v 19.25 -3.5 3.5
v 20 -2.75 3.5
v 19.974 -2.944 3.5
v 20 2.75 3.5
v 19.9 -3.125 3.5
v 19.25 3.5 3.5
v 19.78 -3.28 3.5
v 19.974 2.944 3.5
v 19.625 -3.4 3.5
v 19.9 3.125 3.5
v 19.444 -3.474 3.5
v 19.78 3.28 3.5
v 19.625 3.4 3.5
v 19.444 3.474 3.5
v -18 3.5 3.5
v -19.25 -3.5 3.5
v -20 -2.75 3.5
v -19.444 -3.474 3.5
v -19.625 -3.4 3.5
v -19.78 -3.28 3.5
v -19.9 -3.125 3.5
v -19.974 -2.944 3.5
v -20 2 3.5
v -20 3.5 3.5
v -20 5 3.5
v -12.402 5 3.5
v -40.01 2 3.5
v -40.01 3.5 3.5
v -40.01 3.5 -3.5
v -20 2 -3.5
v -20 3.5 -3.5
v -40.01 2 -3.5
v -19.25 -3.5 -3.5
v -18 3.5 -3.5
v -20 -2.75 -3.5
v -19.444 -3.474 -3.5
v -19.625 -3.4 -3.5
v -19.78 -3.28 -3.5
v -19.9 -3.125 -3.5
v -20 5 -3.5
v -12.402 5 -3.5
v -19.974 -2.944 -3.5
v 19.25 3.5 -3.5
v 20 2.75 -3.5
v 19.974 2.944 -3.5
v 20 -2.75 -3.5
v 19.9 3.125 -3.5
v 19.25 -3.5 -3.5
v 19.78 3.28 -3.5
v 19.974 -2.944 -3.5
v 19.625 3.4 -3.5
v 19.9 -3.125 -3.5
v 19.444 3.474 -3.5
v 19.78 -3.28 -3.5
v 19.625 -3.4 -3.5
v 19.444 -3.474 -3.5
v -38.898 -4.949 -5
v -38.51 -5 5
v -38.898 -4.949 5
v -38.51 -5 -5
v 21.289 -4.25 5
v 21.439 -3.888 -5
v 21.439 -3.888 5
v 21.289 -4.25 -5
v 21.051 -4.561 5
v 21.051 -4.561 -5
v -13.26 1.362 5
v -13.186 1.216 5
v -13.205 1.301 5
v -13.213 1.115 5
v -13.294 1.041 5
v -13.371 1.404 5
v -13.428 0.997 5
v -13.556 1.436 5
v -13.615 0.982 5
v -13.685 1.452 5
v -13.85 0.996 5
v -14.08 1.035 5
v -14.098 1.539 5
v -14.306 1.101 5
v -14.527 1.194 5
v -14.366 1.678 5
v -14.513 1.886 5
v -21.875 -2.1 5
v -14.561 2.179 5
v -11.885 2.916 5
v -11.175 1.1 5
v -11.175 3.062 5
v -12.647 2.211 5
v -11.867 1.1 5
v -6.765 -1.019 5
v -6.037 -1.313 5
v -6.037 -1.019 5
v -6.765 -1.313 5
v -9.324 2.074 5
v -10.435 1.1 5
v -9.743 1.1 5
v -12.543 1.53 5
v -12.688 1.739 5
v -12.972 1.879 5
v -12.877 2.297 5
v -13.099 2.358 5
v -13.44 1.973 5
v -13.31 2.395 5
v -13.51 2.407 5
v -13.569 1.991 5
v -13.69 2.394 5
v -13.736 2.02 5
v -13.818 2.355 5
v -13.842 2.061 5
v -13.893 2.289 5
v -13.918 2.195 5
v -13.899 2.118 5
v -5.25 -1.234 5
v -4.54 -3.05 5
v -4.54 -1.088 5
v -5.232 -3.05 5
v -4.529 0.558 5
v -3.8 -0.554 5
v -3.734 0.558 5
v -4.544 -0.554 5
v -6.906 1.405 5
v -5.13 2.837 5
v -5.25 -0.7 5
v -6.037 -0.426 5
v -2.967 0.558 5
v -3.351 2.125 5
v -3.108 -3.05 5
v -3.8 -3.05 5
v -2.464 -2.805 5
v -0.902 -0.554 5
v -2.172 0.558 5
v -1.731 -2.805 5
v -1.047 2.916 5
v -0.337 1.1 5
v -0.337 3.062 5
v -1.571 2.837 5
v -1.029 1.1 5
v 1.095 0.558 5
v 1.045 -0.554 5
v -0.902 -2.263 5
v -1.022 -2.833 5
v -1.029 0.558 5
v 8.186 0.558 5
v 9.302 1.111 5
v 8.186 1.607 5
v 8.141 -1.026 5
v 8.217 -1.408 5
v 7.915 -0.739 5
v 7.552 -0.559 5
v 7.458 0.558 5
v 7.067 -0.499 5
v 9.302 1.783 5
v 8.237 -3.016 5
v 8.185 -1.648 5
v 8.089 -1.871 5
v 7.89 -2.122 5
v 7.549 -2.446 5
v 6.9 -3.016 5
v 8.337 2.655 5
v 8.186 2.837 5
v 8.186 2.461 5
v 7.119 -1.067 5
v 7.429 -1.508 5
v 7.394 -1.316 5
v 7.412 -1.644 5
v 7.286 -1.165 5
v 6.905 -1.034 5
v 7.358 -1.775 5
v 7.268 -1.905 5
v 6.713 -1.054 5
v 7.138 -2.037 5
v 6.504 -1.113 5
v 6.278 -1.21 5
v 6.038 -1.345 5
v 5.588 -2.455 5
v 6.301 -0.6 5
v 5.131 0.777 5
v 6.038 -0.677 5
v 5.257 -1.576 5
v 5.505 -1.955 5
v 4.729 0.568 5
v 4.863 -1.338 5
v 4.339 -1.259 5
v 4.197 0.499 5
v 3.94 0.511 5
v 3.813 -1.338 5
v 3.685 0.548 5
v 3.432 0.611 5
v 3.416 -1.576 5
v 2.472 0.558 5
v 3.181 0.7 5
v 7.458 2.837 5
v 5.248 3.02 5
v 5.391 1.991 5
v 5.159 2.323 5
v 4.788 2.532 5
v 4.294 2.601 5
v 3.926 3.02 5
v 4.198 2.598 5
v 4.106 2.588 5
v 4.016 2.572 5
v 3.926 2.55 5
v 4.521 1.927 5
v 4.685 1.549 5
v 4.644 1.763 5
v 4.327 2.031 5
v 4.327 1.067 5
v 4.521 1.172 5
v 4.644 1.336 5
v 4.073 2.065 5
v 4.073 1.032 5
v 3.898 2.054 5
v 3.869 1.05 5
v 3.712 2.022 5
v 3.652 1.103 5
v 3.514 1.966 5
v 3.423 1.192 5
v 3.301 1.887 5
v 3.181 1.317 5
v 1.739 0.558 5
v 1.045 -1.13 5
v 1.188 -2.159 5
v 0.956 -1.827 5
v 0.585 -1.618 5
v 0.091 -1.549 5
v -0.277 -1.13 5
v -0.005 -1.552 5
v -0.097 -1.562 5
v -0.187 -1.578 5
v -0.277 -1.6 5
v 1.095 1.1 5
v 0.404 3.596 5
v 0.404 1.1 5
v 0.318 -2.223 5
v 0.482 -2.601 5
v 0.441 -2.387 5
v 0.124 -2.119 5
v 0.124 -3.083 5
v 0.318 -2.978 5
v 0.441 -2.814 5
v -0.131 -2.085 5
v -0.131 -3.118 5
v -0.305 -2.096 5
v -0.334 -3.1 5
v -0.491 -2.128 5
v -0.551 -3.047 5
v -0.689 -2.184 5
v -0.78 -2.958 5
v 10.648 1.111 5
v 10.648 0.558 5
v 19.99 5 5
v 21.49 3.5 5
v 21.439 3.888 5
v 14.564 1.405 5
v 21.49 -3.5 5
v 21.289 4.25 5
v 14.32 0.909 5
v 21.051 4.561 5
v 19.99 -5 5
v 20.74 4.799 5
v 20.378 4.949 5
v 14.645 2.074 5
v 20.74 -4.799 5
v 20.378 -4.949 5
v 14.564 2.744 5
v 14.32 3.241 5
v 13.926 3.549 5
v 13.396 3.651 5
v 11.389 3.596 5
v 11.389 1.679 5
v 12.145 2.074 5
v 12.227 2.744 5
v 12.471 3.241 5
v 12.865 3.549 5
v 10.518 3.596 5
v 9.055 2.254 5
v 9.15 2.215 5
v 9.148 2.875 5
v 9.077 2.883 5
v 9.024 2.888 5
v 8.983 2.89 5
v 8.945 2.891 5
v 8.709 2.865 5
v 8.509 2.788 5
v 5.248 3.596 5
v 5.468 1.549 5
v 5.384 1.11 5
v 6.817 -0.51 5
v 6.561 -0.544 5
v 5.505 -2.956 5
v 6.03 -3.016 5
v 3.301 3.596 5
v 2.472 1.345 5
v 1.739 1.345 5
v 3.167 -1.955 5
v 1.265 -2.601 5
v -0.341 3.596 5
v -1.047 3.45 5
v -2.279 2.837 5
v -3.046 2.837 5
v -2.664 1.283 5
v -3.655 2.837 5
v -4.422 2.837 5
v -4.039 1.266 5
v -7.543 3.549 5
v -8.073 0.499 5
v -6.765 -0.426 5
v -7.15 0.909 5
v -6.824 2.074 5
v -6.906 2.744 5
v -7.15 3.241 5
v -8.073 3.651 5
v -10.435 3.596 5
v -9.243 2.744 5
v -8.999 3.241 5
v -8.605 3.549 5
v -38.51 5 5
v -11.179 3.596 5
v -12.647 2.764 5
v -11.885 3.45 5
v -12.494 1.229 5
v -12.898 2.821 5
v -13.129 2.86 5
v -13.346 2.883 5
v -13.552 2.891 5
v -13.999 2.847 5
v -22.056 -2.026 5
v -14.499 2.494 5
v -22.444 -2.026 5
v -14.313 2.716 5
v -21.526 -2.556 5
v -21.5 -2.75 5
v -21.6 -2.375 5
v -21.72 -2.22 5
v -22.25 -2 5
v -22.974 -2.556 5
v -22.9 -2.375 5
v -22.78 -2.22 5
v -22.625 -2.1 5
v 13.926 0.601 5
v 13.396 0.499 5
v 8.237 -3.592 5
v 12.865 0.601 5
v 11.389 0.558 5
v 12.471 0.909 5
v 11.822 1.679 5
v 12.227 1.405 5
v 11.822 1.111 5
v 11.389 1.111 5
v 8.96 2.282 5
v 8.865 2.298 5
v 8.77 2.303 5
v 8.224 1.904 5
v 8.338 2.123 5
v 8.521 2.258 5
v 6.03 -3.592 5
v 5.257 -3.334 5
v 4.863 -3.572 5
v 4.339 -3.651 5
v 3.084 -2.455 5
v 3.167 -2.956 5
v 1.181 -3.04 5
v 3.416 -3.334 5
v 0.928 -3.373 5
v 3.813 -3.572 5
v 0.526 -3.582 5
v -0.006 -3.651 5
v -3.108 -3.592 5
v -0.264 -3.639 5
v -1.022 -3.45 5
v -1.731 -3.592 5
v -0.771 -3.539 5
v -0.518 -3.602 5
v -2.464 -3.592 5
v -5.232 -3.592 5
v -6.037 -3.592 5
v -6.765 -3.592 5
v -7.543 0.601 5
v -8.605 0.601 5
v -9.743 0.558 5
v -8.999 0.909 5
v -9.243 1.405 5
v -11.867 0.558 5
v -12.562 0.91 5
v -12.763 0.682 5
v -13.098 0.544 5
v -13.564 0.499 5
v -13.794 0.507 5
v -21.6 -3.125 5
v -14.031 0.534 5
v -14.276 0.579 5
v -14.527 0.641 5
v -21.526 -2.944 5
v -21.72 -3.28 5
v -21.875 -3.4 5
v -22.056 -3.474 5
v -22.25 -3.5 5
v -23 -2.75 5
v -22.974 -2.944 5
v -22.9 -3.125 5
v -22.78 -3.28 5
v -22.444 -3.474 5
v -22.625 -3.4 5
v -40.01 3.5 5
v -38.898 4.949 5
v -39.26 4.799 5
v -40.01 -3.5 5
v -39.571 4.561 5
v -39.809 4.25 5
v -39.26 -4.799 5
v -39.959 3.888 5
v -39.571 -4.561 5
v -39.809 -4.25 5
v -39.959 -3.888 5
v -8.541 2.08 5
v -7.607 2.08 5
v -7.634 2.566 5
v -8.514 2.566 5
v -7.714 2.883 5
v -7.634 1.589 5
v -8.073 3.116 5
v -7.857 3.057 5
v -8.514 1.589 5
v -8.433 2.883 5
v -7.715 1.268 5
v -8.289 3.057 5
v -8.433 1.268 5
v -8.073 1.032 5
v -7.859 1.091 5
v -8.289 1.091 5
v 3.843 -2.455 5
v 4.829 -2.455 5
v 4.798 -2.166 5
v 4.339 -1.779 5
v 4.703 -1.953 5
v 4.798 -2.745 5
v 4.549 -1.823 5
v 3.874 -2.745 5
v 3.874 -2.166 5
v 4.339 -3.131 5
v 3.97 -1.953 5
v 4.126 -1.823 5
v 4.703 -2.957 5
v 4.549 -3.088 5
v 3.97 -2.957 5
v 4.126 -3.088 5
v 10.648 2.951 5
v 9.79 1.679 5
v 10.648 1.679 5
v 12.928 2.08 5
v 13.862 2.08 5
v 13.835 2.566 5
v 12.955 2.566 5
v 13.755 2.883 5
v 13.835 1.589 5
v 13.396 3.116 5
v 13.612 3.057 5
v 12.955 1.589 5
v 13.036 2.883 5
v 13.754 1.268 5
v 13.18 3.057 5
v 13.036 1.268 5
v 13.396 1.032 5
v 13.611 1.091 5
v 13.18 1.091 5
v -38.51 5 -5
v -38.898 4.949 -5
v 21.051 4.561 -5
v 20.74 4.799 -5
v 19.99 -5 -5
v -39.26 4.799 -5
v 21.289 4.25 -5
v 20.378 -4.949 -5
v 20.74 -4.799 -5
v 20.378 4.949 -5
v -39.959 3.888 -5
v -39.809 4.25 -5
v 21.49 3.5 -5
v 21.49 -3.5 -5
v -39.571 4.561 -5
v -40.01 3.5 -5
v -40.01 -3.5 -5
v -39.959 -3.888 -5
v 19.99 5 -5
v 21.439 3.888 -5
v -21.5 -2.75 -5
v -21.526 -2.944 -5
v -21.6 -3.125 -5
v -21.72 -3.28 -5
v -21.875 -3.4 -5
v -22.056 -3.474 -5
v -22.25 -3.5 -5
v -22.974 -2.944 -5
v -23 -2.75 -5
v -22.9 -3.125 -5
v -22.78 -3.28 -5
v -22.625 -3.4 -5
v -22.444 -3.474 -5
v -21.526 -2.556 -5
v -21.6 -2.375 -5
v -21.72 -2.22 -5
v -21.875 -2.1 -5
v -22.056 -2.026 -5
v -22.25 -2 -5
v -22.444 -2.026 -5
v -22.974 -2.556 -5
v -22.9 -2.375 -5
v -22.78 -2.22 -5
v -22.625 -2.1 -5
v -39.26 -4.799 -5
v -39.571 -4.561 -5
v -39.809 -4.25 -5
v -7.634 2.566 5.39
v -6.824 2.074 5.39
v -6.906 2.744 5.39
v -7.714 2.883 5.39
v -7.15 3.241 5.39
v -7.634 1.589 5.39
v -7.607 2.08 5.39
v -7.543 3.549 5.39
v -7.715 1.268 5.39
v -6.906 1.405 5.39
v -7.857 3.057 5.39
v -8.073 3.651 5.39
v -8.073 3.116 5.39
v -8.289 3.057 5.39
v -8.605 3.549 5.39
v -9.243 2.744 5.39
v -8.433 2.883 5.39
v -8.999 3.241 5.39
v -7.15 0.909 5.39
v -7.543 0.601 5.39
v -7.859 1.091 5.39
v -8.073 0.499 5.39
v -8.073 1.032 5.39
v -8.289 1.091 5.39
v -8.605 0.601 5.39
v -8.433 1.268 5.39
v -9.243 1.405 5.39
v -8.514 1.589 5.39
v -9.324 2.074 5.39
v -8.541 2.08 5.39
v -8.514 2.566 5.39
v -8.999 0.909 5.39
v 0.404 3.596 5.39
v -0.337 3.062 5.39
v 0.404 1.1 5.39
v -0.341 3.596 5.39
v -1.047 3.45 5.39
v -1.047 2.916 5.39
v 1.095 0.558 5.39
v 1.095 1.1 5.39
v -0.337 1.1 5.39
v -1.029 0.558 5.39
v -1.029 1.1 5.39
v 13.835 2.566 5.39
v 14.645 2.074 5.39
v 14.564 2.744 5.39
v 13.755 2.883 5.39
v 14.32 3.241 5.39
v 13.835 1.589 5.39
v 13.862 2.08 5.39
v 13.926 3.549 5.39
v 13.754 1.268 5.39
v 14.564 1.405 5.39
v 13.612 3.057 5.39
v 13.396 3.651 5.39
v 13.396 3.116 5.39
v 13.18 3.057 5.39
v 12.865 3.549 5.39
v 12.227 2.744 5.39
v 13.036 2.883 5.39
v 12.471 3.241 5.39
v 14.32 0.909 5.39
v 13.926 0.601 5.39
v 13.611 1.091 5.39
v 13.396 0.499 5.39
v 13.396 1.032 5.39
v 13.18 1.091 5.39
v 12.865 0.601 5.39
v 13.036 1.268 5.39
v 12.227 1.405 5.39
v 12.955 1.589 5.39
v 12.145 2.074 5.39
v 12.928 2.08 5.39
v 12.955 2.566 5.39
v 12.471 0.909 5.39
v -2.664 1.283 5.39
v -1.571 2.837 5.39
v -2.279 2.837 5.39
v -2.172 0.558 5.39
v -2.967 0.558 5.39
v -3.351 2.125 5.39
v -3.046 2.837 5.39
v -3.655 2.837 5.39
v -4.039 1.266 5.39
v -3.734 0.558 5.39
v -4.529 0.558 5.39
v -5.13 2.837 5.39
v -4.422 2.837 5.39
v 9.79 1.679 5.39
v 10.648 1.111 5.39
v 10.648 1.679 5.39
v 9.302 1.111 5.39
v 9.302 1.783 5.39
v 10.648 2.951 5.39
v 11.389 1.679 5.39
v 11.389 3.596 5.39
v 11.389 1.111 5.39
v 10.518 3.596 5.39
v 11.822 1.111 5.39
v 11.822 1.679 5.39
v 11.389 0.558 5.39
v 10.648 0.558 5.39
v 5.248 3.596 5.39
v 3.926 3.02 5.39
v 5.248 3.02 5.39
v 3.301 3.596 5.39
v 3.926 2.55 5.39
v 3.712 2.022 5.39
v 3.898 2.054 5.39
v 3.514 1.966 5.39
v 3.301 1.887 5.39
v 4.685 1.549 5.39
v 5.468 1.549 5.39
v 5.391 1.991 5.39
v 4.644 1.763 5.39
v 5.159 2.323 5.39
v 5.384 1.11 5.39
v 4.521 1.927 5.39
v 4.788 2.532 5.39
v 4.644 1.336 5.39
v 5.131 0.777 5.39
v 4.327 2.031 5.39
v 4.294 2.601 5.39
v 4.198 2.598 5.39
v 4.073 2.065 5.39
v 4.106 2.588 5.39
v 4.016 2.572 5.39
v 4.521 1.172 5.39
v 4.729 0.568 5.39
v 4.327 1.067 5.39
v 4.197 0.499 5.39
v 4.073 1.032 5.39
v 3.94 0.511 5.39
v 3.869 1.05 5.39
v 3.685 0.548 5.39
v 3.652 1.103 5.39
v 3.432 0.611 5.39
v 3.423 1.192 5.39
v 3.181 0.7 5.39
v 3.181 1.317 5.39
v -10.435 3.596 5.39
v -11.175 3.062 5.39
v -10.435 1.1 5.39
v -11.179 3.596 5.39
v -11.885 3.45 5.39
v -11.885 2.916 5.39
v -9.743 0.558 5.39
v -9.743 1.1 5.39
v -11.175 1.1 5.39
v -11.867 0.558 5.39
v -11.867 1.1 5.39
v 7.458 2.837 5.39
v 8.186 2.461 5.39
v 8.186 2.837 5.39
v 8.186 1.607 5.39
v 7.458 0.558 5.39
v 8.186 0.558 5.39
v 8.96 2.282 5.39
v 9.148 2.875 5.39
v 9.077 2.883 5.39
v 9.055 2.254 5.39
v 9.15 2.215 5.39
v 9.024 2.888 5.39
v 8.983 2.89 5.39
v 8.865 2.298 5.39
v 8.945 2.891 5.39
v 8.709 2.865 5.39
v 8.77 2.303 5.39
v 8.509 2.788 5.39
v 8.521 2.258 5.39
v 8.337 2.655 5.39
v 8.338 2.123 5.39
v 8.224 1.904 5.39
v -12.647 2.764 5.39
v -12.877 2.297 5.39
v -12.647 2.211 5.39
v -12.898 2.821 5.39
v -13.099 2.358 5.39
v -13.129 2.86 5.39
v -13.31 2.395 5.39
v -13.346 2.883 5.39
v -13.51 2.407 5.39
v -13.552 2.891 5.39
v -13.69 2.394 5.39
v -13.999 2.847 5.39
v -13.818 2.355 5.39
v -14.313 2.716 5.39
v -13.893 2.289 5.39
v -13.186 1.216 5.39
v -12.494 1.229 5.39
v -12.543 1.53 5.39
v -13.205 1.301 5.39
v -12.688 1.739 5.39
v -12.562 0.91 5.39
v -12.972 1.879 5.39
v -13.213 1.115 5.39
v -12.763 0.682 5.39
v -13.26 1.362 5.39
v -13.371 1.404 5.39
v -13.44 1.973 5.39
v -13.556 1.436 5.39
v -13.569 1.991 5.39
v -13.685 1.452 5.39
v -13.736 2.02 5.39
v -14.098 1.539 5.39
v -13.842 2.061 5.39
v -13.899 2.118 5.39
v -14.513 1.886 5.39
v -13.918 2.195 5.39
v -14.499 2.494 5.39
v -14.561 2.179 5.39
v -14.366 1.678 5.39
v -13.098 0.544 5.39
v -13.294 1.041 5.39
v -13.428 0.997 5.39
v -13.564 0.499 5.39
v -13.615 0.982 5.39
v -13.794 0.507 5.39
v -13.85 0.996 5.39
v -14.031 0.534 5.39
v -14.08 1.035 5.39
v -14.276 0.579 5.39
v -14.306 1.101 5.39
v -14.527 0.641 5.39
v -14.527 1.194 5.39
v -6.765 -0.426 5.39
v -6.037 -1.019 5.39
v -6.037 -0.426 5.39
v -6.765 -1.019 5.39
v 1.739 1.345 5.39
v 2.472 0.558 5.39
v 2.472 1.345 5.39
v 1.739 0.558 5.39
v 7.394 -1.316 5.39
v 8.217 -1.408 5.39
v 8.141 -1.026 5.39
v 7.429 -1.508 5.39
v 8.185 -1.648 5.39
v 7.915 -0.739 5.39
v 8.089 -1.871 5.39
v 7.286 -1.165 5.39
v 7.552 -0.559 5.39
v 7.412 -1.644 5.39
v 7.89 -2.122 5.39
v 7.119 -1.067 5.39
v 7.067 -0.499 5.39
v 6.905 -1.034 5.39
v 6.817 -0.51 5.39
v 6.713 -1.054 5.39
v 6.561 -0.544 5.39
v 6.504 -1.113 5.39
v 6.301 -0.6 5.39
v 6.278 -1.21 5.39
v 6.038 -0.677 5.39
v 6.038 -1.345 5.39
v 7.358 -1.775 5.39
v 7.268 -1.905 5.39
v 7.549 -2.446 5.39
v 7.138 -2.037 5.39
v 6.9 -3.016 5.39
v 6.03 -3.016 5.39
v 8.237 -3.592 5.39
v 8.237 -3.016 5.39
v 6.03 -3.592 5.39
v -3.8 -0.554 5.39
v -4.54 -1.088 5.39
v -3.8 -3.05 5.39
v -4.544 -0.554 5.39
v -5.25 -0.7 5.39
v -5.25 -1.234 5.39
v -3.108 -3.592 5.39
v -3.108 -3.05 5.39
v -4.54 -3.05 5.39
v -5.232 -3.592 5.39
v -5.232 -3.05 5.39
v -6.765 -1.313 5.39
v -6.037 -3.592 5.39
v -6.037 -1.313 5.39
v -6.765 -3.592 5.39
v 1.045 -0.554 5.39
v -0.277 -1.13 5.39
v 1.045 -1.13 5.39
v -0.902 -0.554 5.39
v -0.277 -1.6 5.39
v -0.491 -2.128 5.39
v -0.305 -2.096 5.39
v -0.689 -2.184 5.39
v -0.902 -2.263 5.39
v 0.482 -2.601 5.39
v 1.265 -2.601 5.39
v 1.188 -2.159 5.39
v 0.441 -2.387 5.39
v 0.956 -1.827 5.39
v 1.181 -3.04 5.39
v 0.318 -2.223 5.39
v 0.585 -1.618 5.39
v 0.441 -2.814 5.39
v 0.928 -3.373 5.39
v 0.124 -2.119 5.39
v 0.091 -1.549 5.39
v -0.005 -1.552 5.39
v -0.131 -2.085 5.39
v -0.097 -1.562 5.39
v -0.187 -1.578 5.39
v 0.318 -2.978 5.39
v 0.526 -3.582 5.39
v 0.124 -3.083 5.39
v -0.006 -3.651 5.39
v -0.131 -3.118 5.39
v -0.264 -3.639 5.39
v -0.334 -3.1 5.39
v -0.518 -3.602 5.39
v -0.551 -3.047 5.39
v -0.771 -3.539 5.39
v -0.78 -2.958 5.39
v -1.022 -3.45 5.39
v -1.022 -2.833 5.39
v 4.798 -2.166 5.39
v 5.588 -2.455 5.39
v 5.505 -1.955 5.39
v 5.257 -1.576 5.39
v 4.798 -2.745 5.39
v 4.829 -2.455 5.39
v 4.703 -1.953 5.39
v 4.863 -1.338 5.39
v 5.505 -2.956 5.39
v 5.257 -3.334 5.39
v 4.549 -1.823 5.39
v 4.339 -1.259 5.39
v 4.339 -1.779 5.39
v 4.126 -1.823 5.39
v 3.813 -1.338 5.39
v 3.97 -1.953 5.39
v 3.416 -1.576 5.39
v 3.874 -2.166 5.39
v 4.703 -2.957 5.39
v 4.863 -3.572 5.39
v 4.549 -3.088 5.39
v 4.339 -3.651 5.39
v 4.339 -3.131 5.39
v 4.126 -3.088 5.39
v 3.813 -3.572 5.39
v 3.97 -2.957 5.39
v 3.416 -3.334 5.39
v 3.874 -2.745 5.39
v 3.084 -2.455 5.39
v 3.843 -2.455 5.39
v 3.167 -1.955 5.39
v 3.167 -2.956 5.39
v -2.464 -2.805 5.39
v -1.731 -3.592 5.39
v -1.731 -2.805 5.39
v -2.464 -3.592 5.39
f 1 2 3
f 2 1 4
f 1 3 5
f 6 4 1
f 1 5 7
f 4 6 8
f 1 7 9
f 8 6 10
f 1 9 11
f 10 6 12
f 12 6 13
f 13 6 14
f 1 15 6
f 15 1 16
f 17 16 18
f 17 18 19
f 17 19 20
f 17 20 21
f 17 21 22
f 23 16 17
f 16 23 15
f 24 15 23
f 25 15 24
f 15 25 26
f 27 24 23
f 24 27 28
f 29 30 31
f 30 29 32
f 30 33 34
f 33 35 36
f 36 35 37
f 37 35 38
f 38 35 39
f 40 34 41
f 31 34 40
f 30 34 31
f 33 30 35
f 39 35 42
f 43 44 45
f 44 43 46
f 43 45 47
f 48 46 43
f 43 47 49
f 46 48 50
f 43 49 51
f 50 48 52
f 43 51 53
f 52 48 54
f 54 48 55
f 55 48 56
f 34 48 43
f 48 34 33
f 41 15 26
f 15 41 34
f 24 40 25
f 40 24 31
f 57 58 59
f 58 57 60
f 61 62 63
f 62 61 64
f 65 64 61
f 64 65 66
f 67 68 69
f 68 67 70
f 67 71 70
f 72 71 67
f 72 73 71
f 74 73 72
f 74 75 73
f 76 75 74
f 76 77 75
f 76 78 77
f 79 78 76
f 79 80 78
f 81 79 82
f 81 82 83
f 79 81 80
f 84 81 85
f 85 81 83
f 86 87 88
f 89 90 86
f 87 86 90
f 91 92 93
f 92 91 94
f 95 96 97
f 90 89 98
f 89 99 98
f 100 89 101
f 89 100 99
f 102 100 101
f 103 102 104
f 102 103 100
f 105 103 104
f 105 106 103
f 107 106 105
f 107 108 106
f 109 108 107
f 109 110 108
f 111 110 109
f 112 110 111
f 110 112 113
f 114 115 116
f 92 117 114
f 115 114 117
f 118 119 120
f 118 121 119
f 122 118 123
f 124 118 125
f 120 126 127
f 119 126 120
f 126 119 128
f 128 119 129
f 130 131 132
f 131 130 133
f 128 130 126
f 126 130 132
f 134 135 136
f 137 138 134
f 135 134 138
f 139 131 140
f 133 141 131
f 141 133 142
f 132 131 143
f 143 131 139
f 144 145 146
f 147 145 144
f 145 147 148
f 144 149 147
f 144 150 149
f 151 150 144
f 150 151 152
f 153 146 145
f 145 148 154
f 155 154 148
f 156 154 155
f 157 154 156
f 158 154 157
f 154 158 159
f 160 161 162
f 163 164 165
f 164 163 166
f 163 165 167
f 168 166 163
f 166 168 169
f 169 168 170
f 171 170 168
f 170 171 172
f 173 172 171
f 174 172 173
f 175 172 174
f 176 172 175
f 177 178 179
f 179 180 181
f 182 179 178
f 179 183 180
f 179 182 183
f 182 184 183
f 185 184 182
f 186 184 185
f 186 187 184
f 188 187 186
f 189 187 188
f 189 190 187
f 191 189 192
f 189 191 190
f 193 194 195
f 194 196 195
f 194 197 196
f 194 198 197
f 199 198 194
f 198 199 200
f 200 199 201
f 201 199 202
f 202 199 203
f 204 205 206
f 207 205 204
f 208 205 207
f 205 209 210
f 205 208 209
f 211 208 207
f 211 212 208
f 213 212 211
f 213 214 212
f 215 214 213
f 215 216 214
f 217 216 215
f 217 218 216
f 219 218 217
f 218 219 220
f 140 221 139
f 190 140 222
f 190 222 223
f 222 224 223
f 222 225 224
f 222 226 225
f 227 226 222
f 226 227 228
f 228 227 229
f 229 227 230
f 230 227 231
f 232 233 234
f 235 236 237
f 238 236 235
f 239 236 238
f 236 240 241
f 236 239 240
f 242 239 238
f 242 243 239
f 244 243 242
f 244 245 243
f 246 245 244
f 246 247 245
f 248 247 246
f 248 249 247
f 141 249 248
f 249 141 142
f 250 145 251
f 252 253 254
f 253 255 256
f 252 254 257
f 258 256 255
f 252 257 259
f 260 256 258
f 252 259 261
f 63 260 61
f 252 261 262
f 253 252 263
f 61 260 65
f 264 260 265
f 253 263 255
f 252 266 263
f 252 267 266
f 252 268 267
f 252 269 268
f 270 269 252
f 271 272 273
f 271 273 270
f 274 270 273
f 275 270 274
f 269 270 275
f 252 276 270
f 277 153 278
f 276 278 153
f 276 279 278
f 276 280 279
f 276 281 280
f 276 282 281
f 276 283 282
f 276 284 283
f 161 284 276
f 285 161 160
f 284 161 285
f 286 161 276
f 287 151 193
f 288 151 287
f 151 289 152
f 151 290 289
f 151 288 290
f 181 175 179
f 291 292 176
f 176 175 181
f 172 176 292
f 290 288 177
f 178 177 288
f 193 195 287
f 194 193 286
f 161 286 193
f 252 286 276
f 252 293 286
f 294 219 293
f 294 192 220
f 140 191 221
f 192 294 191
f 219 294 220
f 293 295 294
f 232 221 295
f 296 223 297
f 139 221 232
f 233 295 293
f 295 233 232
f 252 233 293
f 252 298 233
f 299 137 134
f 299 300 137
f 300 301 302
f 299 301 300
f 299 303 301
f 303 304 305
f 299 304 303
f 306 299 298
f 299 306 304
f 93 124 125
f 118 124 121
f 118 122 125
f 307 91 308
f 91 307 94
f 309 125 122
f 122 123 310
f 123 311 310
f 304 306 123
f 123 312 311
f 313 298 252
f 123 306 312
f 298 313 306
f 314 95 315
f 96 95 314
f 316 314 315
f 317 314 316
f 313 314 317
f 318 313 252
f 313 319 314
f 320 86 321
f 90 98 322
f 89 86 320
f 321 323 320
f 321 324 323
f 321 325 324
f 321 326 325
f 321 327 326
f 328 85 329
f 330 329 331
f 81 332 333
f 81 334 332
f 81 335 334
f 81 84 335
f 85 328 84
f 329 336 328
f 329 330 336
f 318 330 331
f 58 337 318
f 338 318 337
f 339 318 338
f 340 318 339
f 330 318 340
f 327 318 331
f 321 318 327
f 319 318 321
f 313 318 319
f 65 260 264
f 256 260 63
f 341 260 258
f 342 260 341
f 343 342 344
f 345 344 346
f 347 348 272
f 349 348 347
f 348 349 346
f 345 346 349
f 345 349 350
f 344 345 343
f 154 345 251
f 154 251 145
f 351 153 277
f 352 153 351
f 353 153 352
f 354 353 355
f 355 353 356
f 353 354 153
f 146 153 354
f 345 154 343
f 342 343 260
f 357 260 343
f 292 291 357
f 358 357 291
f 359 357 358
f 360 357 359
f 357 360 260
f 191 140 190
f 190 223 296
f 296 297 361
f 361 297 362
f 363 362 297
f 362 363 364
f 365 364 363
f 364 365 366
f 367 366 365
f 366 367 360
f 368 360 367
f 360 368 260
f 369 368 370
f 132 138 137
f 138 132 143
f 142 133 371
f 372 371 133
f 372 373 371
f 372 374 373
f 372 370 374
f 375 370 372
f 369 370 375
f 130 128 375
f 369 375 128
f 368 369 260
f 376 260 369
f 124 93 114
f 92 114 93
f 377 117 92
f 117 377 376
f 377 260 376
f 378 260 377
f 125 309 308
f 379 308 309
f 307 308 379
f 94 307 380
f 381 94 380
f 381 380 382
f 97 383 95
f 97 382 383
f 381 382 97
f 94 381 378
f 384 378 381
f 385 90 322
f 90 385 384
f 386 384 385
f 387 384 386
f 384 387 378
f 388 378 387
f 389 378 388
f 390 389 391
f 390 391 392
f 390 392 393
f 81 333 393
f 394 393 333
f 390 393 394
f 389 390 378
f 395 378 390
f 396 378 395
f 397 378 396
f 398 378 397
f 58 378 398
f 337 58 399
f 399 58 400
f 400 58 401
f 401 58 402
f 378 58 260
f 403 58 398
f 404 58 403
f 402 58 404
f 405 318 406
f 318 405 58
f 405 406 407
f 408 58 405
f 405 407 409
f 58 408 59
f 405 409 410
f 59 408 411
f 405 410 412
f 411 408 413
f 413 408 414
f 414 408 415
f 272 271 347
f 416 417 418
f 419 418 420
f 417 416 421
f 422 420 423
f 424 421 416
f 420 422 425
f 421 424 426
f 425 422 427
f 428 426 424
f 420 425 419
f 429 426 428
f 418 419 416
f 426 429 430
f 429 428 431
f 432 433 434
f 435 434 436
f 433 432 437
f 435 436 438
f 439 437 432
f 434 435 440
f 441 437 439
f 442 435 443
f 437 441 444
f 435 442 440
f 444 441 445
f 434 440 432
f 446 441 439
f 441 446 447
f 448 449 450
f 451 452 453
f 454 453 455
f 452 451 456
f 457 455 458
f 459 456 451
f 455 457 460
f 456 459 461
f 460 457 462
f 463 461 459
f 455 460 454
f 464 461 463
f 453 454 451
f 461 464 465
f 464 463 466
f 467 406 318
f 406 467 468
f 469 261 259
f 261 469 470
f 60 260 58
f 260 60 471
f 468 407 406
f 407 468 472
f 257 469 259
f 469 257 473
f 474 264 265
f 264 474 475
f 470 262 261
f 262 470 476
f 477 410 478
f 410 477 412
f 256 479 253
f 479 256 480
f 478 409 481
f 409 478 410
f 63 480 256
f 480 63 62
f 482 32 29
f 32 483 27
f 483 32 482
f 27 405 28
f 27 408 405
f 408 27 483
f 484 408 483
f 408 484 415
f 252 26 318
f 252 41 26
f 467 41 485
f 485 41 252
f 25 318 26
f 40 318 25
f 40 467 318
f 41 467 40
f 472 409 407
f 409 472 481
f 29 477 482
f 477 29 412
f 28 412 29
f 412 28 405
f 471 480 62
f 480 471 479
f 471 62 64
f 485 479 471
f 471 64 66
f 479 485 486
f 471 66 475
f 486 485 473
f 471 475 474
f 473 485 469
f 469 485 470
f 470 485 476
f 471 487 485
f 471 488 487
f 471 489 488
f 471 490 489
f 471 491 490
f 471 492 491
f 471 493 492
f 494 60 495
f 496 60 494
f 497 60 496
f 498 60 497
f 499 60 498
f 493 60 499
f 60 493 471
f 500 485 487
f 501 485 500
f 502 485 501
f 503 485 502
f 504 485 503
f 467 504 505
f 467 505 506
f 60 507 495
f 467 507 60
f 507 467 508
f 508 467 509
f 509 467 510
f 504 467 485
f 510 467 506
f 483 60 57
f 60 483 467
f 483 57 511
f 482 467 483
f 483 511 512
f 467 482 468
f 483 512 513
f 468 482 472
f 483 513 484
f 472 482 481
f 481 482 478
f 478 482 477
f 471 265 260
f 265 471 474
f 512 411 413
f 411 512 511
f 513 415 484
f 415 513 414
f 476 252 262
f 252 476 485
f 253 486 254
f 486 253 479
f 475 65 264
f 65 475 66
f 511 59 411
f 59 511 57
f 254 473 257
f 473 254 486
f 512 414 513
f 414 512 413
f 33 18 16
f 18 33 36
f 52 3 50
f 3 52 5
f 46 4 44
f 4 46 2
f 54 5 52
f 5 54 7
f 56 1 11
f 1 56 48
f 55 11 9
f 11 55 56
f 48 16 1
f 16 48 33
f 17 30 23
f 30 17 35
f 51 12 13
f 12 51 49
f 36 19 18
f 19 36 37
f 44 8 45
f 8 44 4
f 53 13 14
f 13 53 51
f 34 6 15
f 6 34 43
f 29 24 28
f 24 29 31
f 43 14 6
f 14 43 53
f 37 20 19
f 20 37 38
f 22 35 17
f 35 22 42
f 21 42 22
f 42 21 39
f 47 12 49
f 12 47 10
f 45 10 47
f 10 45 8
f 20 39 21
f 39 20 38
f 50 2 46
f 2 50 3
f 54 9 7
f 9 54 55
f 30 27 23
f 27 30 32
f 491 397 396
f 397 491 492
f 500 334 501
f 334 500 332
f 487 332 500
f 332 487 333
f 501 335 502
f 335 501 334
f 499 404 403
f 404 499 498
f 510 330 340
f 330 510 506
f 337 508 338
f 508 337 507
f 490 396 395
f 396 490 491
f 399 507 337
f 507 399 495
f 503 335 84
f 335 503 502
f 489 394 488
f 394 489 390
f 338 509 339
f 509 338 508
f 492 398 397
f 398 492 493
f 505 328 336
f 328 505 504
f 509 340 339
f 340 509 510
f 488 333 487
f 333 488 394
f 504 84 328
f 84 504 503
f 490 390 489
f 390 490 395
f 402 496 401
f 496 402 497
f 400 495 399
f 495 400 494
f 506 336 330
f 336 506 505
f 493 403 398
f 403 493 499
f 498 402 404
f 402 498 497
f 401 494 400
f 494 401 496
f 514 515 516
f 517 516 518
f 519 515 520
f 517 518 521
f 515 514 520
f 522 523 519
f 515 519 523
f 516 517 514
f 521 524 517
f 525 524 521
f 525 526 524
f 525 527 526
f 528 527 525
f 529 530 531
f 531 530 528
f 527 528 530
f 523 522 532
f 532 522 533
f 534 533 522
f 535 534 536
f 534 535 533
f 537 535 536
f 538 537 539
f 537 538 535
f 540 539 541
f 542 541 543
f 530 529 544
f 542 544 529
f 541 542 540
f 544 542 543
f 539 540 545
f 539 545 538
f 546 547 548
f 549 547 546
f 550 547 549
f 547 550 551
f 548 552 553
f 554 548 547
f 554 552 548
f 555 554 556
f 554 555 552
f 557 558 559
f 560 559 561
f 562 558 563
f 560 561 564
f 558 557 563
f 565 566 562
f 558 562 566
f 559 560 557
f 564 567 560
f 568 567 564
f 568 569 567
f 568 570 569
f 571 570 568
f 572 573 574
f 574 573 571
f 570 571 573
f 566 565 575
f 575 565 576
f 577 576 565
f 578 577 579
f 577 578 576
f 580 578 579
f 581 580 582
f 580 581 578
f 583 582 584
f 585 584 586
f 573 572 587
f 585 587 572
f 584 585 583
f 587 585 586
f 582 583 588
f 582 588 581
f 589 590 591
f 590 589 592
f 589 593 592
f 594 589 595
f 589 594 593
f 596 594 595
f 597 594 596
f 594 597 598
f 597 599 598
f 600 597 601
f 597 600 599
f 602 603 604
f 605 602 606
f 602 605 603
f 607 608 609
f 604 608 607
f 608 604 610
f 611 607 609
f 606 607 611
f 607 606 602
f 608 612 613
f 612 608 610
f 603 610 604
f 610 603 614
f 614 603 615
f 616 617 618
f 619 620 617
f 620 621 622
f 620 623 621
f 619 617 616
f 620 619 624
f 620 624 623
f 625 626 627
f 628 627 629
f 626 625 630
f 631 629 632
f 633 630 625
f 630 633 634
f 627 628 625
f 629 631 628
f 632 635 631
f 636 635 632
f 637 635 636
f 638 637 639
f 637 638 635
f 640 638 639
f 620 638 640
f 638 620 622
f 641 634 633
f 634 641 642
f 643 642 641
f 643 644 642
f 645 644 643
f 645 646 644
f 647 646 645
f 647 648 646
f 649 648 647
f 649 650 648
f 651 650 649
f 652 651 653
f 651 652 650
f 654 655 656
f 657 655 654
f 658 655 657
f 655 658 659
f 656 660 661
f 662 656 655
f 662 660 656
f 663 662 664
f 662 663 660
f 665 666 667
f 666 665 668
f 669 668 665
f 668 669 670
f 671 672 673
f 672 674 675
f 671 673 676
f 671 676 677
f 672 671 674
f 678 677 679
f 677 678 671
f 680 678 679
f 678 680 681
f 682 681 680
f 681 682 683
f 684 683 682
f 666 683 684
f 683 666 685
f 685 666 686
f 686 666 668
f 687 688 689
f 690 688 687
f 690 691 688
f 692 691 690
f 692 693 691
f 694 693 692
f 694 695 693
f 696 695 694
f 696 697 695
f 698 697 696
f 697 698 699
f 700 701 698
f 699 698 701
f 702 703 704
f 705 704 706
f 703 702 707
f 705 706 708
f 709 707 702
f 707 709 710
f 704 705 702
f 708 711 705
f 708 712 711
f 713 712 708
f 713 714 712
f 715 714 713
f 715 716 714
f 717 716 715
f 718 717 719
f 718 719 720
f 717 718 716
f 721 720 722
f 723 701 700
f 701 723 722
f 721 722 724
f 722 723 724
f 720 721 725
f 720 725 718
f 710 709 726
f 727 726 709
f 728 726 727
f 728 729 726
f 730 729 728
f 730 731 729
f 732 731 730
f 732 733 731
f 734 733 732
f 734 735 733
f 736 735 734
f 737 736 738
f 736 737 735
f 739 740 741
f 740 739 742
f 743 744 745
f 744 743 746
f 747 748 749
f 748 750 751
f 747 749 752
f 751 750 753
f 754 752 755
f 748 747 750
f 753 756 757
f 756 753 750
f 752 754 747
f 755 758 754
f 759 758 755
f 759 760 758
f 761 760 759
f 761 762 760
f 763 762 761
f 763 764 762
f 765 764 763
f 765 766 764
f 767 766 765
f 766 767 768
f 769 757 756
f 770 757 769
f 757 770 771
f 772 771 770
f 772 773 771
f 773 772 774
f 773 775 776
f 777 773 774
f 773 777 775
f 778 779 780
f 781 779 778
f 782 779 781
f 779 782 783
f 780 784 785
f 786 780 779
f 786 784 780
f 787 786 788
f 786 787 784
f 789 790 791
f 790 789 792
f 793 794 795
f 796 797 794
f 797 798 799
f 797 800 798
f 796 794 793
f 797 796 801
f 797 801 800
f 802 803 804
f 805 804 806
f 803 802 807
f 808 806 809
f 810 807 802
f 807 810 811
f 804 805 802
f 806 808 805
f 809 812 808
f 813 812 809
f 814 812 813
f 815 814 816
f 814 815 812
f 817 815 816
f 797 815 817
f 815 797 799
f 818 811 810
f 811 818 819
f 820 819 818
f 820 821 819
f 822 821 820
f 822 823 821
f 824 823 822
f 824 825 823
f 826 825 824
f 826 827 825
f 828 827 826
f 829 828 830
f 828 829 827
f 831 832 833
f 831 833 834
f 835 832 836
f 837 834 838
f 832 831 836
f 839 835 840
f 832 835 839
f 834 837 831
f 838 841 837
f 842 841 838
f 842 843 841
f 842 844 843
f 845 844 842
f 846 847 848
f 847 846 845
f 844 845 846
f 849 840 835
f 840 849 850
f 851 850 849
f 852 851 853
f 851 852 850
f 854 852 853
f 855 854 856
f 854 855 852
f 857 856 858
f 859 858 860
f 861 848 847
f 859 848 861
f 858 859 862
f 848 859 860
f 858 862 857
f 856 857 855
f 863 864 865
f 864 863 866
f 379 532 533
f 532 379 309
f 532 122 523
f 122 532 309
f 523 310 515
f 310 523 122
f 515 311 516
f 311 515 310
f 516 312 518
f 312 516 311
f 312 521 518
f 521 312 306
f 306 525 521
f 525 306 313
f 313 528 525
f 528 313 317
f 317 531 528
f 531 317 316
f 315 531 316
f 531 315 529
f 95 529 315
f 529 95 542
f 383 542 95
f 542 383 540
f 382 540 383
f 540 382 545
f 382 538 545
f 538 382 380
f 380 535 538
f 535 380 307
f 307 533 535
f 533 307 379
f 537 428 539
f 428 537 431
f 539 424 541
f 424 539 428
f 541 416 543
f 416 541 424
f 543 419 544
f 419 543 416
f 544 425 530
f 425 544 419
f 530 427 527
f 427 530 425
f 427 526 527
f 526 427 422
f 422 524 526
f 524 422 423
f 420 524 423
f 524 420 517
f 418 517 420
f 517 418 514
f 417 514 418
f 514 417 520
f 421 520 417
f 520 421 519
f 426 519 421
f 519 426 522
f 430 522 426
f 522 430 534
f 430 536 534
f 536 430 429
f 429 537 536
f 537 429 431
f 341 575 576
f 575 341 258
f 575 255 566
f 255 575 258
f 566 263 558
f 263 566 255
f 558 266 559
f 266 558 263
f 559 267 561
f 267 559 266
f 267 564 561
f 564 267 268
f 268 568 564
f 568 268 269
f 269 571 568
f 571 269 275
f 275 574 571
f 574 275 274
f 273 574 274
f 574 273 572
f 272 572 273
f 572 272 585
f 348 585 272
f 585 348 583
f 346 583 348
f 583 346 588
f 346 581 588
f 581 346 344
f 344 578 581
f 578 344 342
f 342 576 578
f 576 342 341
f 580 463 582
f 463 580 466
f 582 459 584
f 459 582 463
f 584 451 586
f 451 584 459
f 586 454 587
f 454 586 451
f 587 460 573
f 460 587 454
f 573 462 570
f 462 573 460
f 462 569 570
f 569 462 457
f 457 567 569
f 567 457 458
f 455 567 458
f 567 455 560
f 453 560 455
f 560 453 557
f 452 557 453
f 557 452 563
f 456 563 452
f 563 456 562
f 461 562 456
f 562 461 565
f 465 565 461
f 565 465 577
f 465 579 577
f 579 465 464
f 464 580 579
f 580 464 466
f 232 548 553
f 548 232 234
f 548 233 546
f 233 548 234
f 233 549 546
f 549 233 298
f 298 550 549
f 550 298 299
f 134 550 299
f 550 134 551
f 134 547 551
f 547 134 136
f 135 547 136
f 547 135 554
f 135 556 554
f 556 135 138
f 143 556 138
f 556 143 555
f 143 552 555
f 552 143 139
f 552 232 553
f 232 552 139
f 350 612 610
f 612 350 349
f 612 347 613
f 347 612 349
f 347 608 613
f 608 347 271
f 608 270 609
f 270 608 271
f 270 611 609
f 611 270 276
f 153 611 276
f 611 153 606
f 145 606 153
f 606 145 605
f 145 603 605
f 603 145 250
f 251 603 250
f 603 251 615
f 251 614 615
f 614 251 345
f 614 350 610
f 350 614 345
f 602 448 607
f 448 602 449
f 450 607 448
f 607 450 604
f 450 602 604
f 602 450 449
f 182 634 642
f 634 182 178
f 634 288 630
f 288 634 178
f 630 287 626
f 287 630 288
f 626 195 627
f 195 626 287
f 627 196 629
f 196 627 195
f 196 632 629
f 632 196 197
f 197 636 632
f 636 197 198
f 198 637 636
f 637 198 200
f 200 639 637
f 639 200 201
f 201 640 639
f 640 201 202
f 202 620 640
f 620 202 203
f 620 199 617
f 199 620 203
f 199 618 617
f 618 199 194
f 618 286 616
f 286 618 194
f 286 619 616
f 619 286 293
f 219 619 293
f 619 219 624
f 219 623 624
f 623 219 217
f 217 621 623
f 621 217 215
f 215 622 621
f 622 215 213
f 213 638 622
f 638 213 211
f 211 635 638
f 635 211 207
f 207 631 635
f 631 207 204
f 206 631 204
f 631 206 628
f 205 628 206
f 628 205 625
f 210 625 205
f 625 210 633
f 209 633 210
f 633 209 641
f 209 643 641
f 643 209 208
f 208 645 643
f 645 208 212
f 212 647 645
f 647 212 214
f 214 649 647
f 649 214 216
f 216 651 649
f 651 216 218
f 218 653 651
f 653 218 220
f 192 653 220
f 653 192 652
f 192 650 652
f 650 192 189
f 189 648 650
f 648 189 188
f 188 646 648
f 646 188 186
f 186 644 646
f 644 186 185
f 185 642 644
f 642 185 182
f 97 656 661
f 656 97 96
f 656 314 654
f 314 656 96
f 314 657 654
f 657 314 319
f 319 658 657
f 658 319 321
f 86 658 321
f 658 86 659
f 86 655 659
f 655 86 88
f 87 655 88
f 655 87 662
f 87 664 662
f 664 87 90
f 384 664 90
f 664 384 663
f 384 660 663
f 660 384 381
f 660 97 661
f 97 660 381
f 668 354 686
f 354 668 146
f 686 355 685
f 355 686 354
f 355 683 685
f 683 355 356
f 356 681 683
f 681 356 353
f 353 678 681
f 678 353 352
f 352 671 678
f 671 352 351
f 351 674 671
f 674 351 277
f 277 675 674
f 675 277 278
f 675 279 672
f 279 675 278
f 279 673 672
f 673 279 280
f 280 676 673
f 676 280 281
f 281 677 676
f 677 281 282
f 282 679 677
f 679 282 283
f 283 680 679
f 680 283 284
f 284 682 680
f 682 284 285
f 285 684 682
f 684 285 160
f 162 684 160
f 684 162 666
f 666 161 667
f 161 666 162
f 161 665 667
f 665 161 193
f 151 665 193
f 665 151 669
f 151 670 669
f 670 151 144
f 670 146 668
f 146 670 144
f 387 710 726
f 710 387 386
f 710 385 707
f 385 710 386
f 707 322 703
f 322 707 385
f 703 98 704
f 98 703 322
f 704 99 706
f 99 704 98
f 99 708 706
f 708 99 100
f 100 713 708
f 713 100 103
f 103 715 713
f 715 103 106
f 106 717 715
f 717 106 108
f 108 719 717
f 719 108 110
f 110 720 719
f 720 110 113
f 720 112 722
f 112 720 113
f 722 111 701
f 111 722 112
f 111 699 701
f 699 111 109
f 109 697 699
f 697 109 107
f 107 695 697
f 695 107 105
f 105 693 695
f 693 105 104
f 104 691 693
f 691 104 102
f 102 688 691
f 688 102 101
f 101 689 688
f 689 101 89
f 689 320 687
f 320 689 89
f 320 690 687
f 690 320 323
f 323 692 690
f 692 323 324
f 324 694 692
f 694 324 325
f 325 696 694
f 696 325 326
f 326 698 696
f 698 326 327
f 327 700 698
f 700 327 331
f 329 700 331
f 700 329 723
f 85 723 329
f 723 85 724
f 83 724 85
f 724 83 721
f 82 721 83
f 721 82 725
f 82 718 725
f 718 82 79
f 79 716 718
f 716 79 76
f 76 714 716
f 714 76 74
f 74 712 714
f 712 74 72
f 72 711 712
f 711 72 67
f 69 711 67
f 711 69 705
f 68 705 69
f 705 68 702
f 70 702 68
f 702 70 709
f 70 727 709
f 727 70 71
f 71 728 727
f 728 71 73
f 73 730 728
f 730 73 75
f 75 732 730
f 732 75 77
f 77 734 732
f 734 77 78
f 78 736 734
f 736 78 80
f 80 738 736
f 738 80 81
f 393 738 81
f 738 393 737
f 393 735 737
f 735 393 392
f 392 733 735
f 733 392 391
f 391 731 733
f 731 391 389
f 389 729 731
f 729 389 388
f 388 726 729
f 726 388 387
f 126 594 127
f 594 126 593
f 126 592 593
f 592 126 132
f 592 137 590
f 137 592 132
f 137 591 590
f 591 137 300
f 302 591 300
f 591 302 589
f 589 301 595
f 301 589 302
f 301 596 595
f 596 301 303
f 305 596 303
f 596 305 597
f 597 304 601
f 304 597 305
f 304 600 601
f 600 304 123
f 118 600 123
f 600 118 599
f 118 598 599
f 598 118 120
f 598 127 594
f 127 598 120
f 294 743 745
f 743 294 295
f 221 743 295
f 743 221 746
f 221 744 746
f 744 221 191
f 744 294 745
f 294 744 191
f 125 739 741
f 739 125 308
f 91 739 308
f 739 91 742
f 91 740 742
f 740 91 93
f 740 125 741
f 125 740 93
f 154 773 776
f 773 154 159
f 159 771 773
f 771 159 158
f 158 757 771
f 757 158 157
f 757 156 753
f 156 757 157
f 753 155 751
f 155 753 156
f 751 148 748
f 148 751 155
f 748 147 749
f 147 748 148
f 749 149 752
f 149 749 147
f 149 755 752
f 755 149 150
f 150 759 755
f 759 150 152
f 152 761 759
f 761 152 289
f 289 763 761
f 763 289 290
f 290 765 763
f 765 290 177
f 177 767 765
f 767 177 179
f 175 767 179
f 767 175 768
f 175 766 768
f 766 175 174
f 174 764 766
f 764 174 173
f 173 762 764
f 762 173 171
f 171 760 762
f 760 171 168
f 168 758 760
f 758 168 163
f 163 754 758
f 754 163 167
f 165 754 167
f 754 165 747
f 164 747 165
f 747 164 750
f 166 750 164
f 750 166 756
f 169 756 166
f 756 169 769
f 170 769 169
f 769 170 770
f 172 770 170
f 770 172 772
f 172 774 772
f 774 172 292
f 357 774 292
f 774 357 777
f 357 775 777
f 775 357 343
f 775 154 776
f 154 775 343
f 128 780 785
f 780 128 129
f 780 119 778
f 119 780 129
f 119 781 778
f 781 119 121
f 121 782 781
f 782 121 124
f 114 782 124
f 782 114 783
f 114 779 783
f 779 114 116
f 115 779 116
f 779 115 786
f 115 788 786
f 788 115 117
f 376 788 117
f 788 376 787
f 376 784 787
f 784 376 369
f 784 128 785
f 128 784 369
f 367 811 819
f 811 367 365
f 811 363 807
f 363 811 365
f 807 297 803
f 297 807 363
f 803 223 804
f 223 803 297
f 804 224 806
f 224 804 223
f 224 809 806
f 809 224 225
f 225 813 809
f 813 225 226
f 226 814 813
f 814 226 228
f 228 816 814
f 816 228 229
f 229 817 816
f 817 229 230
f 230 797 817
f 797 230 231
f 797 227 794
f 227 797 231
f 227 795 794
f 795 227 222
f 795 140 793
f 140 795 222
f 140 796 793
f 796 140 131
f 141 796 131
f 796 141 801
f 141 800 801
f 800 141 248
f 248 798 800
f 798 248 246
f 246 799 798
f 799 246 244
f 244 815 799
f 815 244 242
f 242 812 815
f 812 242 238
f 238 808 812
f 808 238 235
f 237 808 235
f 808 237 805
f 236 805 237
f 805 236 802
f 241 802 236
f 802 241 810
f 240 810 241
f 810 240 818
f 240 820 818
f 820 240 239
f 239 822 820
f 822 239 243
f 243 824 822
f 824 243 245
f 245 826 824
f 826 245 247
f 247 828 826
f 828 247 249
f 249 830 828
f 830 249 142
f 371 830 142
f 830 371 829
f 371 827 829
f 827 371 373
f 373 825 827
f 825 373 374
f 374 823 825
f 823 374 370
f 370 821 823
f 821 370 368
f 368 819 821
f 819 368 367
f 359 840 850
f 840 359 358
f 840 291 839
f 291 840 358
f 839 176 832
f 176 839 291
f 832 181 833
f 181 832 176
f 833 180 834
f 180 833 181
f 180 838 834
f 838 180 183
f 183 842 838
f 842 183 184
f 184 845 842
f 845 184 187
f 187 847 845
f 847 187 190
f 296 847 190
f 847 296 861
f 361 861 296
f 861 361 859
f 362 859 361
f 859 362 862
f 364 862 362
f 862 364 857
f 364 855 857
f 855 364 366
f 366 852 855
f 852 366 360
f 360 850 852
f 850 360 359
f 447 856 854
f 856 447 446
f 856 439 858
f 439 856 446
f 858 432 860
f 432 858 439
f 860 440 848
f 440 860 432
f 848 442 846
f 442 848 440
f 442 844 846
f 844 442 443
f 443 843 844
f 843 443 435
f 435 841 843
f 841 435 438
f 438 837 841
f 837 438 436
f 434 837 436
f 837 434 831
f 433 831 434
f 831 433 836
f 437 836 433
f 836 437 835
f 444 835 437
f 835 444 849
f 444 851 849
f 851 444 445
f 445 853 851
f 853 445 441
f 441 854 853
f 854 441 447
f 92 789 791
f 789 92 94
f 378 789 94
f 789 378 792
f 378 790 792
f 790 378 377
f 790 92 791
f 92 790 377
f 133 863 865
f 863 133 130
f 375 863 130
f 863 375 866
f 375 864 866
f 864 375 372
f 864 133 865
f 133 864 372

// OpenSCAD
// file: ../../lib/ops.scad
module repeat_row(step, count) {
    assert(is_list(step) && 2 <= len(step) && len(step) <= 3);
    for (comp = step) assert(is_num(comp));
    assert(is_num(count));

    for (i = [0 : count - 1])
    translate(step * i)
        children();
}


module arrange_row(step) {
    assert(is_list(step) && 2 <= len(step) && len(step) <= 3);
    for (comp = step) assert(is_num(comp));

    for (i = [0 : $children - 1])
    translate(step * i)
        children(i);
}


module arrange_hex(d, e) {
    h = d * sin(60);
    r = d / 2;

    cols = e;
    rows = ceil((e + 1) / 2);

    module repeat(row, col) {
        children();

        if (row < rows - 1 && col < cols - 1)
        translate([
            r / 2,
            h / 2,
            0
        ])
            children();
    }

    translate([
        - cols / 2 * r + r / 2,
        - rows / 2 * h + h / 2,
        0,
    ])
    for (
        col = [0 : cols - 1],
        row = [0 : rows - 1]
    )
    translate([
        col * r,
        row * h,
        0
    ]) {
        repeat(row, col)
            children();
    }

        // if (abs(col) + abs(row) * 2 <= e) {
        //     translate([col * d / 2, row * h, 0])
        //         children();
        // }
}


module flatten(thickness) {
    INF = 10 ^ 5;

    intersection() {
        children();
        cube([INF, INF, thickness], center = true);
    }
}


module spin2d(length, turns, scal = undef, slices = undef) {
    linear_extrude(length, twist = turns * 360, slices = is_undef(slices) ? length * turns : slices, scale = scal, center = true, convexity = abs(turns) * 2)
        children();
}


module spin3d(length, turns, steps, scal) {
    translate([0, 0, - length / 2])
    for (p = [0 : 1 / steps : 1]) {
        a = - turns * p * 360;
        z = length * p;

        s = lerp(1, scal, p);

        translate([0, 0, z])
        rotate([0, 0, a])
        scale(s)
            children();
    }
}

module rounden_xyz(r, $fn = 24) {
    minkowski() {
        children();
        sphere(r);
    }
}

module rounden_xy(r, $fn = 24) {
    minkowski() {
        children();
        cylinder(r * 2, r = r, center = true);
    }
}
// main file
use <../../lib/ops.scad>

CUT = false;

/* [General] */

// Length of the tip that touches the mouth
tip_len = 20;

// Side of the whistle
side = 10;

// Wall thickness
wall = 1.5;

// Size of the air inlet
inlet = 1.5;

// Size of the air outlet in front of the cutting edge
outlet = 2;

/* [Resonator] */

// Length of the resonator
resonator_len = 40;

// Whether the end is open
open = false;


module __hidden__() {};

wall_vec = [wall, wall, wall] * 2;

L = resonator_len + tip_len + wall;

E = 0.01;
NOZ = 0.4;


module base() {
    reduction = open ? wall : 0;

    translate([- (tip_len - wall) / 2 - reduction / 2 - E, 0, 0])
    rounden_xy(wall)
    cube([L - reduction, side, side] - wall_vec, center = true);
}

module resonator() {
    extension = open ? wall : 0;

    translate([extension / 2, 0, 0])
    rounden_xy(wall / 2)
    cube([resonator_len + extension, side - wall * 2, side - wall * 2] - wall_vec / 2, center = true);
}

module inlet() {
    translate([- L / 2, side / 2 - inlet / 2 - wall, 0])
    cube([L, inlet, side - wall * 2], center = true);
}

module outlet() {
    cutter_a = 15;
    cutter_l = wall / sin(cutter_a);
    cutter_h = wall / cos(cutter_a);

    translate([- resonator_len / 2 + outlet, side / 2 - wall, 0]) {
        rotate([0, 0, cutter_a])
        translate([cutter_l / 2, cutter_h / 2, 0])
        cube([cutter_l, cutter_h, side - wall * 2], center = true);

        translate([-outlet / 2, side / 4, 0])
        cube([outlet, side / 2 + E, side - wall * 2], center = true);
    }
}

module hole() {
    translate([- resonator_len / 2 - wall * 3/2, - side / 2 + wall * 3/2, 0])
    cylinder(side + E, r = wall / 2, center = true, $fn = 24);
}

module info() {
    linear_extrude(NOZ) {
        size = 3;

        translate([0, 0.5, 0])
        text(str("s", side, " w", wall, " r", resonator_len),
            size = size,
            font = "JetBrains Mono:style=Bold",
            valign = "bottom",
            halign = "center"
        );

        translate([0, -0.5, 0])
        text(str( " i", inlet, " o", outlet),
            size = size,
            font = "JetBrains Mono:style=Bold",
            valign = "top",
            halign = "center"
        );
    }
}

module whistle() {
    difference() {
        base();

        resonator();
        inlet();
        outlet();

        hole();
    }

    color("red")
    translate([0, 0, side / 2 - E])
    info();
}


if (CUT) {
    projection(cut = true)
    whistle();
} else {
    whistle();
}
